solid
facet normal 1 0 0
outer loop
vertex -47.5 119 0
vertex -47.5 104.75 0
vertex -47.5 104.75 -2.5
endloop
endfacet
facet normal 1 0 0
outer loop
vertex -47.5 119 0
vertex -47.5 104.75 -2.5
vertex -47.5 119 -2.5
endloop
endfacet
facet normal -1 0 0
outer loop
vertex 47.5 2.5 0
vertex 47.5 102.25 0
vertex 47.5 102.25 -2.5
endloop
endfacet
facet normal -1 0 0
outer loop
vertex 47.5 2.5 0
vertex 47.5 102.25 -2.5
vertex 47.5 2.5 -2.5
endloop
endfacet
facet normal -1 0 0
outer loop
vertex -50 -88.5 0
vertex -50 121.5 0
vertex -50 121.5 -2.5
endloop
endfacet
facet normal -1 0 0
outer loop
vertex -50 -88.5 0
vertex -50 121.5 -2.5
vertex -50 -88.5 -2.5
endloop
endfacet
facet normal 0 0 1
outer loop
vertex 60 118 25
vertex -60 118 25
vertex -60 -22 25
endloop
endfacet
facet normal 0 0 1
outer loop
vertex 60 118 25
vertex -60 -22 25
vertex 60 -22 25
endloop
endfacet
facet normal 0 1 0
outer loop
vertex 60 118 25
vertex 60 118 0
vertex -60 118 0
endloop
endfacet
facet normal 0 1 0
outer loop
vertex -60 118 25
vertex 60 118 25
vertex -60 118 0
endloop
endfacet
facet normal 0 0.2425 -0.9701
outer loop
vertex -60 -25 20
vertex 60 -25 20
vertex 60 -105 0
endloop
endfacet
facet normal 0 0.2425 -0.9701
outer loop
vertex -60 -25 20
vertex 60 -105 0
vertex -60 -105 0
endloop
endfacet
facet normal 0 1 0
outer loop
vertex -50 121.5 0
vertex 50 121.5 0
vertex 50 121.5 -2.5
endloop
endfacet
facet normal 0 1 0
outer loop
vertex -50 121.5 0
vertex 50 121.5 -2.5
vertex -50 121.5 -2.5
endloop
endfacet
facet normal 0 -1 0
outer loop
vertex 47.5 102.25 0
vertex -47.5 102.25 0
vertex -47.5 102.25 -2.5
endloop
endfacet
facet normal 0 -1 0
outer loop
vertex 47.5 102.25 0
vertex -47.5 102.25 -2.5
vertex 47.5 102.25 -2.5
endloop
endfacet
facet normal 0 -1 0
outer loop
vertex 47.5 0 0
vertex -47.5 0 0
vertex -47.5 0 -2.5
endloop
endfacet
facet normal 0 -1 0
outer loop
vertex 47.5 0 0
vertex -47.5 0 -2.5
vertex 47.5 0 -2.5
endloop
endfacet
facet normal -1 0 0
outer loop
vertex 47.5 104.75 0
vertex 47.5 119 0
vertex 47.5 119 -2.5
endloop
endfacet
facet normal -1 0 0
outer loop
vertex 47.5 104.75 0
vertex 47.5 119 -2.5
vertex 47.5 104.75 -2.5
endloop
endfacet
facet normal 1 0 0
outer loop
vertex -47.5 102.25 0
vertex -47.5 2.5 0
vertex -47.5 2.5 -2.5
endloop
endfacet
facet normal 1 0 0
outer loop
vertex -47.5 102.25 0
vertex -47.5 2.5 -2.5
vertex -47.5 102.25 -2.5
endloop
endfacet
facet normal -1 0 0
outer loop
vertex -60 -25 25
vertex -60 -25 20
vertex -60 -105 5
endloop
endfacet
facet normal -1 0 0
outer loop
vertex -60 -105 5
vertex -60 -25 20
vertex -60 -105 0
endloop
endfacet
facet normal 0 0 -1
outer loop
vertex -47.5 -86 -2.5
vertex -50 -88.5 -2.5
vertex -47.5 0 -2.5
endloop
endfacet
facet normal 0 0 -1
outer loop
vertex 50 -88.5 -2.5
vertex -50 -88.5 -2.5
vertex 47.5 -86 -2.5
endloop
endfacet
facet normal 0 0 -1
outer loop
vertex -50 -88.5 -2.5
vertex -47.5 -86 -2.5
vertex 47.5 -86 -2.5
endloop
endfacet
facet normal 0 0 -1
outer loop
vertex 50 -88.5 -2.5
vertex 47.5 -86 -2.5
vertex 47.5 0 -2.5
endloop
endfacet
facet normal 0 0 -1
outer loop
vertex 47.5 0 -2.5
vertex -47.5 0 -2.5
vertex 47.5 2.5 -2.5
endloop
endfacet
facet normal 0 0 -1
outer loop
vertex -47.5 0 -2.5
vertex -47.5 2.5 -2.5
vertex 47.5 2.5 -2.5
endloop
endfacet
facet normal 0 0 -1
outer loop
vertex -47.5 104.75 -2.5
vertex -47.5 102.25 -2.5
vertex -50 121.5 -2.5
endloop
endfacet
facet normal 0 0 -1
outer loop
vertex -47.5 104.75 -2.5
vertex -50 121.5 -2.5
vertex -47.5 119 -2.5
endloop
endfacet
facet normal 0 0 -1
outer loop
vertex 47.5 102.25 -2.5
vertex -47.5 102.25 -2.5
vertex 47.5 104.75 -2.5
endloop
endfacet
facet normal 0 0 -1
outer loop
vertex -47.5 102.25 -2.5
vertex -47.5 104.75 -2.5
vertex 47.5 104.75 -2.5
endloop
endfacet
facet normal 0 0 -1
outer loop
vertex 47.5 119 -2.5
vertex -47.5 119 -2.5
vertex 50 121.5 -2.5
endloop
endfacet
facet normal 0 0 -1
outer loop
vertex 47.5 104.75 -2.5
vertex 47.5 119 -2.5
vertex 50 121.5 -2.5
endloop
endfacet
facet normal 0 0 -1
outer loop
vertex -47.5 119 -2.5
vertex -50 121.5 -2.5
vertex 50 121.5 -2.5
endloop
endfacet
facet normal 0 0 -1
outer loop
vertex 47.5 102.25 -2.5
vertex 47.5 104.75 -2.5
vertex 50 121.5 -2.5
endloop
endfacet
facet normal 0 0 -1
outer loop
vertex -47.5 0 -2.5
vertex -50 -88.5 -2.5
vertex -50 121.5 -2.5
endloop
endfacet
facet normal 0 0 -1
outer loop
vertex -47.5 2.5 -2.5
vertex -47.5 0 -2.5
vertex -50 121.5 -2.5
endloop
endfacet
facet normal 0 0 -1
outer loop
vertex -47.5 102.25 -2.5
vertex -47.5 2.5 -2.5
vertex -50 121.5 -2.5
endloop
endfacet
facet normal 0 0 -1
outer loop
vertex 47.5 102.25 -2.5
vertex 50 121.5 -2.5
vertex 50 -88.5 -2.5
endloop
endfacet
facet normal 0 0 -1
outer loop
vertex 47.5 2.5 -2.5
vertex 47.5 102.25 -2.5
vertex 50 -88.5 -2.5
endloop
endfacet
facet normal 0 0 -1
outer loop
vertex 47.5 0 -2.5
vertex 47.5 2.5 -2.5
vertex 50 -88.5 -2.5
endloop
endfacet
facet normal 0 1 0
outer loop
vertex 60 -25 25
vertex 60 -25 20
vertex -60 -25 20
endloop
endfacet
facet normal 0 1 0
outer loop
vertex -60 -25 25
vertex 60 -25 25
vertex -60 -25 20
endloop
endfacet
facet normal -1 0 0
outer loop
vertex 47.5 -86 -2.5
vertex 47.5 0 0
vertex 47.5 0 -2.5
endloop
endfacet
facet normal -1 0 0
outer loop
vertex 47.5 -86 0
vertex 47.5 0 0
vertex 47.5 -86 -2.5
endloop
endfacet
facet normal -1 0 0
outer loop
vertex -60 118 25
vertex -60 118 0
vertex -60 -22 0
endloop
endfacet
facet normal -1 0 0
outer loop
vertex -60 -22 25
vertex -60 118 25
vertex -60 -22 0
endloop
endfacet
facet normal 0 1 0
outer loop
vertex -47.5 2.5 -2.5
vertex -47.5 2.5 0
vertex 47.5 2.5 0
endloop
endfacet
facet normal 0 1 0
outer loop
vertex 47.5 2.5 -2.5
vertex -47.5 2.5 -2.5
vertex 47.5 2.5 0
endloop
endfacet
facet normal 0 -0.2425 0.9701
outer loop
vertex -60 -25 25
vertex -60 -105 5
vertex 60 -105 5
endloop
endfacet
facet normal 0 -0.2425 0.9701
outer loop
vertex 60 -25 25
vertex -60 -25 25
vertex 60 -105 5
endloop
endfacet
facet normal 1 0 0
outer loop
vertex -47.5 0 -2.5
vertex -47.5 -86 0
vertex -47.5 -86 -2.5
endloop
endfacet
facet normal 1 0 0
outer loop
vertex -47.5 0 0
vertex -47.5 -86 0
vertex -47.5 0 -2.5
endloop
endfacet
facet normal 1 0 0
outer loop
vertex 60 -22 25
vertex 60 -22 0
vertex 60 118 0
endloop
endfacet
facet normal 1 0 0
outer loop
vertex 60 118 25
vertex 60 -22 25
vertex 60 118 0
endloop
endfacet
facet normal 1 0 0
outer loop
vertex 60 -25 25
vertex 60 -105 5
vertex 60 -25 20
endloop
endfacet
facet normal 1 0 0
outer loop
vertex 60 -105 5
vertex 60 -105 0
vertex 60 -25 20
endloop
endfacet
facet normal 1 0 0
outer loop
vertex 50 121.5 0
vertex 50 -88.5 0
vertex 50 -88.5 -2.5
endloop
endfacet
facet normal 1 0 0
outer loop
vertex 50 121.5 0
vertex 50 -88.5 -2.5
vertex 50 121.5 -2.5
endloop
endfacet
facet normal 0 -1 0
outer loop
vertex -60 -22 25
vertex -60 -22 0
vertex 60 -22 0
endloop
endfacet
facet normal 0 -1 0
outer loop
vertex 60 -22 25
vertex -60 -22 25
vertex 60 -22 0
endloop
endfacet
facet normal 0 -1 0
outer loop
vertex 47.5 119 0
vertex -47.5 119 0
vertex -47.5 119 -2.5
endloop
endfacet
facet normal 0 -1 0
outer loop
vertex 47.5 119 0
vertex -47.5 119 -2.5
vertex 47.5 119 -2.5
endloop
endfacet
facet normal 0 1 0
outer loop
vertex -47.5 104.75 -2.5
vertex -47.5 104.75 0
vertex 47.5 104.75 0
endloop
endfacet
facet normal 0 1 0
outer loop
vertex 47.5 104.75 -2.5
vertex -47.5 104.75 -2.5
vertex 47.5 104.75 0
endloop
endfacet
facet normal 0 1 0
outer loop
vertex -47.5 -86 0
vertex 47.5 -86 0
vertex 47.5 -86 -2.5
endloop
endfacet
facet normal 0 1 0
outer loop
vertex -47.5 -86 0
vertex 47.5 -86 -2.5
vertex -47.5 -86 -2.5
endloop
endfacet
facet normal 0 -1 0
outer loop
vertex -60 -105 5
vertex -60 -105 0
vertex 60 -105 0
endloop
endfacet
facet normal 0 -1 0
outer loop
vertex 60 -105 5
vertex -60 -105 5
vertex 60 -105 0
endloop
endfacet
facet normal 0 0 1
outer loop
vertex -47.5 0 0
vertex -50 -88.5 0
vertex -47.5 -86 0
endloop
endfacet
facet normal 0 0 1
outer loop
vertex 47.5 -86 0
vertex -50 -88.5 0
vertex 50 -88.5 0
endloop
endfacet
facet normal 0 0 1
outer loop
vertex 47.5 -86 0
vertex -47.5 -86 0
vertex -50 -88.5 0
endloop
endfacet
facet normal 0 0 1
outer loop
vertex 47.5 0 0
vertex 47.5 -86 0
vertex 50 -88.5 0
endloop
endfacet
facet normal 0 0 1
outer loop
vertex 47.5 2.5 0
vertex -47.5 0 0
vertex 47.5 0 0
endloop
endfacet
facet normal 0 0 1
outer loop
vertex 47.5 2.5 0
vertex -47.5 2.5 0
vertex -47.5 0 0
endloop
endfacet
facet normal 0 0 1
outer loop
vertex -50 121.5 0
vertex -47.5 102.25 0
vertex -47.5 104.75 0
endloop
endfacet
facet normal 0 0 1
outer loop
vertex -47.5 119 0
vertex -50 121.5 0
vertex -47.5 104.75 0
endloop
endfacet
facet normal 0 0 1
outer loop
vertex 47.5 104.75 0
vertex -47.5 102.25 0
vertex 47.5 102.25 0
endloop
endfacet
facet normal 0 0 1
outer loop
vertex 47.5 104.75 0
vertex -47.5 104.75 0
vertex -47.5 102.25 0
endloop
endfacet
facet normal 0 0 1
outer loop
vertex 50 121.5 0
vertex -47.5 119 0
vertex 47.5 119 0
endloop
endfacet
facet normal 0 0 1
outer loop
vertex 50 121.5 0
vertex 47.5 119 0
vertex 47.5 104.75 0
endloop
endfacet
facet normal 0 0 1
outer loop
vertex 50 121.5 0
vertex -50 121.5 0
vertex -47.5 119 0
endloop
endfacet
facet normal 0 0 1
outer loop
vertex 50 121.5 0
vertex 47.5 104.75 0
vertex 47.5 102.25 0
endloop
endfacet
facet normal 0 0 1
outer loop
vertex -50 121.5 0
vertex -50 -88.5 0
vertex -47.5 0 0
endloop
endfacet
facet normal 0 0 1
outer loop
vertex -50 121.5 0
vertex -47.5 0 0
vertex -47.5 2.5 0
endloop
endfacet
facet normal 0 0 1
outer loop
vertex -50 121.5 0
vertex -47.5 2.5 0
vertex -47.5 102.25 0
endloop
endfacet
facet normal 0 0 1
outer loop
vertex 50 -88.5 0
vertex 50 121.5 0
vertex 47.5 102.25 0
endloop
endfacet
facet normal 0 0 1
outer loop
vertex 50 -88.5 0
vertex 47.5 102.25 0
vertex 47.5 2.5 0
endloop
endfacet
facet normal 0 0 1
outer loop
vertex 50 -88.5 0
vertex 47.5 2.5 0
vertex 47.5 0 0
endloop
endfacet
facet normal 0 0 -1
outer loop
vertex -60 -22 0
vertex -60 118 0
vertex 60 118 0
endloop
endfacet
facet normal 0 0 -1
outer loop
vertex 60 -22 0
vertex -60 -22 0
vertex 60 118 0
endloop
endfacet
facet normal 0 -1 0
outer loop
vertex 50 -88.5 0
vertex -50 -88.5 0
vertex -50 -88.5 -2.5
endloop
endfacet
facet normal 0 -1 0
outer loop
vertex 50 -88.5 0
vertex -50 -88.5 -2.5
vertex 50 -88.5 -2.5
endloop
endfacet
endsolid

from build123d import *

# Parameters (mm, degrees)
F0_W       = 95
F0_H       = 2.5
F0_W_2     = 2.5
F0_H_2     = 22
F0_H_3     = 3
F1_DEPTH   = 2.5
F0_H_4     = 99.75
F0_H_5     = 13.25
F2_DEPTH   = 25
F0_H_6     = 61
F3_DEPTH   = 25
F4_SIZE2   = 19.99999
F4_SIZE    = 79.99999
F4_2_SIZE2 = 19.99999
F4_2_SIZE  = 79.99999


# Not quite as in the source:
# - a fillet or chamfer is up to 0.001 mm smaller than in the source, because OpenCascade refuses the exact size


with BuildPart() as f1:
    # F0 (on Top) → F1 (new body)
    with BuildSketch(Plane.XY):
        Polygon((-47.5, 118), (-50, 118), (-50, 0), (-47.5, 0), (-47.5, 2.5), (-47.5, 102.25), (-47.5, 104.75), align=None)
        Polygon((50, 121.5), (-50, 121.5), (-50, 118), (-47.5, 118), (-47.5, 119), (47.5, 119), (47.5, 118), (50, 118), align=None)
        with Locations((0, 103.5)):
            Rectangle(F0_W, F0_H)
        Polygon((50, 0), (50, 118), (47.5, 118), (47.5, 104.75), (47.5, 102.25), (47.5, 2.5), (47.5, 0), align=None)
        with Locations((0, 1.25)):
            Rectangle(F0_W, F0_H)
        with Locations((-48.75, -11)):
            Rectangle(F0_W_2, F0_H_2)
        Polygon((-47.5, -25), (-50, -25), (-50, -88.5), (50, -88.5), (50, -25), (47.5, -25), (47.5, -86), (-47.5, -86), align=None)
        with Locations((48.75, -11)):
            Rectangle(F0_W_2, F0_H_2)
        with Locations((-48.75, -23.5)):
            Rectangle(F0_W_2, F0_H_3)
        with Locations((48.75, -23.5)):
            Rectangle(F0_W_2, F0_H_3)
    extrude(amount=-F1_DEPTH)


with BuildPart() as f2:
    # F0 (on Top) → F2 (new body)
    with BuildSketch(Plane.XY):
        with Locations((-48.75, -11)):
            Rectangle(F0_W_2, F0_H_2)
        with Locations((0, -11)):
            Rectangle(F0_W, F0_H_2)
        with Locations((48.75, -11)):
            Rectangle(F0_W_2, F0_H_2)
        Polygon((60, 118), (50, 118), (50, 0), (50, -22), (60, -22), align=None)
        with Locations((0, 1.25)):
            Rectangle(F0_W, F0_H)
        Polygon((50, 0), (50, 118), (47.5, 118), (47.5, 104.75), (47.5, 102.25), (47.5, 2.5), (47.5, 0), align=None)
        Polygon((-47.5, 118), (-50, 118), (-50, 0), (-47.5, 0), (-47.5, 2.5), (-47.5, 102.25), (-47.5, 104.75), align=None)
        with Locations((0, 103.5)):
            Rectangle(F0_W, F0_H)
        Polygon((-50, 0), (-50, 118), (-60, 118), (-60, -22), (-50, -22), align=None)
        with Locations((0, 52.375)):
            Rectangle(F0_W, F0_H_4)
        with Locations((0, 111.375)):
            Rectangle(F0_W, F0_H_5)
    extrude(amount=F2_DEPTH)


with BuildPart() as f3:
    # F0 (on Top) → F3 (new body)
    with BuildSketch(Plane.XY):
        Polygon((-50, -88.5), (-50, -25), (-60, -25), (-60, -105), (60, -105), (60, -25), (50, -25), (50, -88.5), align=None)
        Polygon((-47.5, -25), (-50, -25), (-50, -88.5), (50, -88.5), (50, -25), (47.5, -25), (47.5, -86), (-47.5, -86), align=None)
        with Locations((0, -55.5)):
            Rectangle(F0_W, F0_H_6)
    extrude(amount=F3_DEPTH)

    # F4 (size 80 and 20 in the source; OpenCascade refuses exactly that, so slightly less here)
    f4_edges = [f3.edges().sort_by_distance(p)[0] for p in [
        (0, -105, 25),
    ]]
    f4_side = f3.faces().sort_by_distance((0, -65, 25))[0]
    chamfer(f4_edges, length=F4_SIZE, length2=F4_SIZE2, reference=f4_side)

    # F4#2 (size 80 and 20 in the source; OpenCascade refuses exactly that, so slightly less here)
    f4_2_edges = [f3.edges().sort_by_distance(p)[0] for p in [
        (0, -25, 0),
    ]]
    f4_2_side = f3.faces().sort_by_distance((0, -65, 0))[0]
    chamfer(f4_2_edges, length=F4_2_SIZE, length2=F4_2_SIZE2, reference=f4_2_side)


solid = Compound([f1.part, f2.part, f3.part])
